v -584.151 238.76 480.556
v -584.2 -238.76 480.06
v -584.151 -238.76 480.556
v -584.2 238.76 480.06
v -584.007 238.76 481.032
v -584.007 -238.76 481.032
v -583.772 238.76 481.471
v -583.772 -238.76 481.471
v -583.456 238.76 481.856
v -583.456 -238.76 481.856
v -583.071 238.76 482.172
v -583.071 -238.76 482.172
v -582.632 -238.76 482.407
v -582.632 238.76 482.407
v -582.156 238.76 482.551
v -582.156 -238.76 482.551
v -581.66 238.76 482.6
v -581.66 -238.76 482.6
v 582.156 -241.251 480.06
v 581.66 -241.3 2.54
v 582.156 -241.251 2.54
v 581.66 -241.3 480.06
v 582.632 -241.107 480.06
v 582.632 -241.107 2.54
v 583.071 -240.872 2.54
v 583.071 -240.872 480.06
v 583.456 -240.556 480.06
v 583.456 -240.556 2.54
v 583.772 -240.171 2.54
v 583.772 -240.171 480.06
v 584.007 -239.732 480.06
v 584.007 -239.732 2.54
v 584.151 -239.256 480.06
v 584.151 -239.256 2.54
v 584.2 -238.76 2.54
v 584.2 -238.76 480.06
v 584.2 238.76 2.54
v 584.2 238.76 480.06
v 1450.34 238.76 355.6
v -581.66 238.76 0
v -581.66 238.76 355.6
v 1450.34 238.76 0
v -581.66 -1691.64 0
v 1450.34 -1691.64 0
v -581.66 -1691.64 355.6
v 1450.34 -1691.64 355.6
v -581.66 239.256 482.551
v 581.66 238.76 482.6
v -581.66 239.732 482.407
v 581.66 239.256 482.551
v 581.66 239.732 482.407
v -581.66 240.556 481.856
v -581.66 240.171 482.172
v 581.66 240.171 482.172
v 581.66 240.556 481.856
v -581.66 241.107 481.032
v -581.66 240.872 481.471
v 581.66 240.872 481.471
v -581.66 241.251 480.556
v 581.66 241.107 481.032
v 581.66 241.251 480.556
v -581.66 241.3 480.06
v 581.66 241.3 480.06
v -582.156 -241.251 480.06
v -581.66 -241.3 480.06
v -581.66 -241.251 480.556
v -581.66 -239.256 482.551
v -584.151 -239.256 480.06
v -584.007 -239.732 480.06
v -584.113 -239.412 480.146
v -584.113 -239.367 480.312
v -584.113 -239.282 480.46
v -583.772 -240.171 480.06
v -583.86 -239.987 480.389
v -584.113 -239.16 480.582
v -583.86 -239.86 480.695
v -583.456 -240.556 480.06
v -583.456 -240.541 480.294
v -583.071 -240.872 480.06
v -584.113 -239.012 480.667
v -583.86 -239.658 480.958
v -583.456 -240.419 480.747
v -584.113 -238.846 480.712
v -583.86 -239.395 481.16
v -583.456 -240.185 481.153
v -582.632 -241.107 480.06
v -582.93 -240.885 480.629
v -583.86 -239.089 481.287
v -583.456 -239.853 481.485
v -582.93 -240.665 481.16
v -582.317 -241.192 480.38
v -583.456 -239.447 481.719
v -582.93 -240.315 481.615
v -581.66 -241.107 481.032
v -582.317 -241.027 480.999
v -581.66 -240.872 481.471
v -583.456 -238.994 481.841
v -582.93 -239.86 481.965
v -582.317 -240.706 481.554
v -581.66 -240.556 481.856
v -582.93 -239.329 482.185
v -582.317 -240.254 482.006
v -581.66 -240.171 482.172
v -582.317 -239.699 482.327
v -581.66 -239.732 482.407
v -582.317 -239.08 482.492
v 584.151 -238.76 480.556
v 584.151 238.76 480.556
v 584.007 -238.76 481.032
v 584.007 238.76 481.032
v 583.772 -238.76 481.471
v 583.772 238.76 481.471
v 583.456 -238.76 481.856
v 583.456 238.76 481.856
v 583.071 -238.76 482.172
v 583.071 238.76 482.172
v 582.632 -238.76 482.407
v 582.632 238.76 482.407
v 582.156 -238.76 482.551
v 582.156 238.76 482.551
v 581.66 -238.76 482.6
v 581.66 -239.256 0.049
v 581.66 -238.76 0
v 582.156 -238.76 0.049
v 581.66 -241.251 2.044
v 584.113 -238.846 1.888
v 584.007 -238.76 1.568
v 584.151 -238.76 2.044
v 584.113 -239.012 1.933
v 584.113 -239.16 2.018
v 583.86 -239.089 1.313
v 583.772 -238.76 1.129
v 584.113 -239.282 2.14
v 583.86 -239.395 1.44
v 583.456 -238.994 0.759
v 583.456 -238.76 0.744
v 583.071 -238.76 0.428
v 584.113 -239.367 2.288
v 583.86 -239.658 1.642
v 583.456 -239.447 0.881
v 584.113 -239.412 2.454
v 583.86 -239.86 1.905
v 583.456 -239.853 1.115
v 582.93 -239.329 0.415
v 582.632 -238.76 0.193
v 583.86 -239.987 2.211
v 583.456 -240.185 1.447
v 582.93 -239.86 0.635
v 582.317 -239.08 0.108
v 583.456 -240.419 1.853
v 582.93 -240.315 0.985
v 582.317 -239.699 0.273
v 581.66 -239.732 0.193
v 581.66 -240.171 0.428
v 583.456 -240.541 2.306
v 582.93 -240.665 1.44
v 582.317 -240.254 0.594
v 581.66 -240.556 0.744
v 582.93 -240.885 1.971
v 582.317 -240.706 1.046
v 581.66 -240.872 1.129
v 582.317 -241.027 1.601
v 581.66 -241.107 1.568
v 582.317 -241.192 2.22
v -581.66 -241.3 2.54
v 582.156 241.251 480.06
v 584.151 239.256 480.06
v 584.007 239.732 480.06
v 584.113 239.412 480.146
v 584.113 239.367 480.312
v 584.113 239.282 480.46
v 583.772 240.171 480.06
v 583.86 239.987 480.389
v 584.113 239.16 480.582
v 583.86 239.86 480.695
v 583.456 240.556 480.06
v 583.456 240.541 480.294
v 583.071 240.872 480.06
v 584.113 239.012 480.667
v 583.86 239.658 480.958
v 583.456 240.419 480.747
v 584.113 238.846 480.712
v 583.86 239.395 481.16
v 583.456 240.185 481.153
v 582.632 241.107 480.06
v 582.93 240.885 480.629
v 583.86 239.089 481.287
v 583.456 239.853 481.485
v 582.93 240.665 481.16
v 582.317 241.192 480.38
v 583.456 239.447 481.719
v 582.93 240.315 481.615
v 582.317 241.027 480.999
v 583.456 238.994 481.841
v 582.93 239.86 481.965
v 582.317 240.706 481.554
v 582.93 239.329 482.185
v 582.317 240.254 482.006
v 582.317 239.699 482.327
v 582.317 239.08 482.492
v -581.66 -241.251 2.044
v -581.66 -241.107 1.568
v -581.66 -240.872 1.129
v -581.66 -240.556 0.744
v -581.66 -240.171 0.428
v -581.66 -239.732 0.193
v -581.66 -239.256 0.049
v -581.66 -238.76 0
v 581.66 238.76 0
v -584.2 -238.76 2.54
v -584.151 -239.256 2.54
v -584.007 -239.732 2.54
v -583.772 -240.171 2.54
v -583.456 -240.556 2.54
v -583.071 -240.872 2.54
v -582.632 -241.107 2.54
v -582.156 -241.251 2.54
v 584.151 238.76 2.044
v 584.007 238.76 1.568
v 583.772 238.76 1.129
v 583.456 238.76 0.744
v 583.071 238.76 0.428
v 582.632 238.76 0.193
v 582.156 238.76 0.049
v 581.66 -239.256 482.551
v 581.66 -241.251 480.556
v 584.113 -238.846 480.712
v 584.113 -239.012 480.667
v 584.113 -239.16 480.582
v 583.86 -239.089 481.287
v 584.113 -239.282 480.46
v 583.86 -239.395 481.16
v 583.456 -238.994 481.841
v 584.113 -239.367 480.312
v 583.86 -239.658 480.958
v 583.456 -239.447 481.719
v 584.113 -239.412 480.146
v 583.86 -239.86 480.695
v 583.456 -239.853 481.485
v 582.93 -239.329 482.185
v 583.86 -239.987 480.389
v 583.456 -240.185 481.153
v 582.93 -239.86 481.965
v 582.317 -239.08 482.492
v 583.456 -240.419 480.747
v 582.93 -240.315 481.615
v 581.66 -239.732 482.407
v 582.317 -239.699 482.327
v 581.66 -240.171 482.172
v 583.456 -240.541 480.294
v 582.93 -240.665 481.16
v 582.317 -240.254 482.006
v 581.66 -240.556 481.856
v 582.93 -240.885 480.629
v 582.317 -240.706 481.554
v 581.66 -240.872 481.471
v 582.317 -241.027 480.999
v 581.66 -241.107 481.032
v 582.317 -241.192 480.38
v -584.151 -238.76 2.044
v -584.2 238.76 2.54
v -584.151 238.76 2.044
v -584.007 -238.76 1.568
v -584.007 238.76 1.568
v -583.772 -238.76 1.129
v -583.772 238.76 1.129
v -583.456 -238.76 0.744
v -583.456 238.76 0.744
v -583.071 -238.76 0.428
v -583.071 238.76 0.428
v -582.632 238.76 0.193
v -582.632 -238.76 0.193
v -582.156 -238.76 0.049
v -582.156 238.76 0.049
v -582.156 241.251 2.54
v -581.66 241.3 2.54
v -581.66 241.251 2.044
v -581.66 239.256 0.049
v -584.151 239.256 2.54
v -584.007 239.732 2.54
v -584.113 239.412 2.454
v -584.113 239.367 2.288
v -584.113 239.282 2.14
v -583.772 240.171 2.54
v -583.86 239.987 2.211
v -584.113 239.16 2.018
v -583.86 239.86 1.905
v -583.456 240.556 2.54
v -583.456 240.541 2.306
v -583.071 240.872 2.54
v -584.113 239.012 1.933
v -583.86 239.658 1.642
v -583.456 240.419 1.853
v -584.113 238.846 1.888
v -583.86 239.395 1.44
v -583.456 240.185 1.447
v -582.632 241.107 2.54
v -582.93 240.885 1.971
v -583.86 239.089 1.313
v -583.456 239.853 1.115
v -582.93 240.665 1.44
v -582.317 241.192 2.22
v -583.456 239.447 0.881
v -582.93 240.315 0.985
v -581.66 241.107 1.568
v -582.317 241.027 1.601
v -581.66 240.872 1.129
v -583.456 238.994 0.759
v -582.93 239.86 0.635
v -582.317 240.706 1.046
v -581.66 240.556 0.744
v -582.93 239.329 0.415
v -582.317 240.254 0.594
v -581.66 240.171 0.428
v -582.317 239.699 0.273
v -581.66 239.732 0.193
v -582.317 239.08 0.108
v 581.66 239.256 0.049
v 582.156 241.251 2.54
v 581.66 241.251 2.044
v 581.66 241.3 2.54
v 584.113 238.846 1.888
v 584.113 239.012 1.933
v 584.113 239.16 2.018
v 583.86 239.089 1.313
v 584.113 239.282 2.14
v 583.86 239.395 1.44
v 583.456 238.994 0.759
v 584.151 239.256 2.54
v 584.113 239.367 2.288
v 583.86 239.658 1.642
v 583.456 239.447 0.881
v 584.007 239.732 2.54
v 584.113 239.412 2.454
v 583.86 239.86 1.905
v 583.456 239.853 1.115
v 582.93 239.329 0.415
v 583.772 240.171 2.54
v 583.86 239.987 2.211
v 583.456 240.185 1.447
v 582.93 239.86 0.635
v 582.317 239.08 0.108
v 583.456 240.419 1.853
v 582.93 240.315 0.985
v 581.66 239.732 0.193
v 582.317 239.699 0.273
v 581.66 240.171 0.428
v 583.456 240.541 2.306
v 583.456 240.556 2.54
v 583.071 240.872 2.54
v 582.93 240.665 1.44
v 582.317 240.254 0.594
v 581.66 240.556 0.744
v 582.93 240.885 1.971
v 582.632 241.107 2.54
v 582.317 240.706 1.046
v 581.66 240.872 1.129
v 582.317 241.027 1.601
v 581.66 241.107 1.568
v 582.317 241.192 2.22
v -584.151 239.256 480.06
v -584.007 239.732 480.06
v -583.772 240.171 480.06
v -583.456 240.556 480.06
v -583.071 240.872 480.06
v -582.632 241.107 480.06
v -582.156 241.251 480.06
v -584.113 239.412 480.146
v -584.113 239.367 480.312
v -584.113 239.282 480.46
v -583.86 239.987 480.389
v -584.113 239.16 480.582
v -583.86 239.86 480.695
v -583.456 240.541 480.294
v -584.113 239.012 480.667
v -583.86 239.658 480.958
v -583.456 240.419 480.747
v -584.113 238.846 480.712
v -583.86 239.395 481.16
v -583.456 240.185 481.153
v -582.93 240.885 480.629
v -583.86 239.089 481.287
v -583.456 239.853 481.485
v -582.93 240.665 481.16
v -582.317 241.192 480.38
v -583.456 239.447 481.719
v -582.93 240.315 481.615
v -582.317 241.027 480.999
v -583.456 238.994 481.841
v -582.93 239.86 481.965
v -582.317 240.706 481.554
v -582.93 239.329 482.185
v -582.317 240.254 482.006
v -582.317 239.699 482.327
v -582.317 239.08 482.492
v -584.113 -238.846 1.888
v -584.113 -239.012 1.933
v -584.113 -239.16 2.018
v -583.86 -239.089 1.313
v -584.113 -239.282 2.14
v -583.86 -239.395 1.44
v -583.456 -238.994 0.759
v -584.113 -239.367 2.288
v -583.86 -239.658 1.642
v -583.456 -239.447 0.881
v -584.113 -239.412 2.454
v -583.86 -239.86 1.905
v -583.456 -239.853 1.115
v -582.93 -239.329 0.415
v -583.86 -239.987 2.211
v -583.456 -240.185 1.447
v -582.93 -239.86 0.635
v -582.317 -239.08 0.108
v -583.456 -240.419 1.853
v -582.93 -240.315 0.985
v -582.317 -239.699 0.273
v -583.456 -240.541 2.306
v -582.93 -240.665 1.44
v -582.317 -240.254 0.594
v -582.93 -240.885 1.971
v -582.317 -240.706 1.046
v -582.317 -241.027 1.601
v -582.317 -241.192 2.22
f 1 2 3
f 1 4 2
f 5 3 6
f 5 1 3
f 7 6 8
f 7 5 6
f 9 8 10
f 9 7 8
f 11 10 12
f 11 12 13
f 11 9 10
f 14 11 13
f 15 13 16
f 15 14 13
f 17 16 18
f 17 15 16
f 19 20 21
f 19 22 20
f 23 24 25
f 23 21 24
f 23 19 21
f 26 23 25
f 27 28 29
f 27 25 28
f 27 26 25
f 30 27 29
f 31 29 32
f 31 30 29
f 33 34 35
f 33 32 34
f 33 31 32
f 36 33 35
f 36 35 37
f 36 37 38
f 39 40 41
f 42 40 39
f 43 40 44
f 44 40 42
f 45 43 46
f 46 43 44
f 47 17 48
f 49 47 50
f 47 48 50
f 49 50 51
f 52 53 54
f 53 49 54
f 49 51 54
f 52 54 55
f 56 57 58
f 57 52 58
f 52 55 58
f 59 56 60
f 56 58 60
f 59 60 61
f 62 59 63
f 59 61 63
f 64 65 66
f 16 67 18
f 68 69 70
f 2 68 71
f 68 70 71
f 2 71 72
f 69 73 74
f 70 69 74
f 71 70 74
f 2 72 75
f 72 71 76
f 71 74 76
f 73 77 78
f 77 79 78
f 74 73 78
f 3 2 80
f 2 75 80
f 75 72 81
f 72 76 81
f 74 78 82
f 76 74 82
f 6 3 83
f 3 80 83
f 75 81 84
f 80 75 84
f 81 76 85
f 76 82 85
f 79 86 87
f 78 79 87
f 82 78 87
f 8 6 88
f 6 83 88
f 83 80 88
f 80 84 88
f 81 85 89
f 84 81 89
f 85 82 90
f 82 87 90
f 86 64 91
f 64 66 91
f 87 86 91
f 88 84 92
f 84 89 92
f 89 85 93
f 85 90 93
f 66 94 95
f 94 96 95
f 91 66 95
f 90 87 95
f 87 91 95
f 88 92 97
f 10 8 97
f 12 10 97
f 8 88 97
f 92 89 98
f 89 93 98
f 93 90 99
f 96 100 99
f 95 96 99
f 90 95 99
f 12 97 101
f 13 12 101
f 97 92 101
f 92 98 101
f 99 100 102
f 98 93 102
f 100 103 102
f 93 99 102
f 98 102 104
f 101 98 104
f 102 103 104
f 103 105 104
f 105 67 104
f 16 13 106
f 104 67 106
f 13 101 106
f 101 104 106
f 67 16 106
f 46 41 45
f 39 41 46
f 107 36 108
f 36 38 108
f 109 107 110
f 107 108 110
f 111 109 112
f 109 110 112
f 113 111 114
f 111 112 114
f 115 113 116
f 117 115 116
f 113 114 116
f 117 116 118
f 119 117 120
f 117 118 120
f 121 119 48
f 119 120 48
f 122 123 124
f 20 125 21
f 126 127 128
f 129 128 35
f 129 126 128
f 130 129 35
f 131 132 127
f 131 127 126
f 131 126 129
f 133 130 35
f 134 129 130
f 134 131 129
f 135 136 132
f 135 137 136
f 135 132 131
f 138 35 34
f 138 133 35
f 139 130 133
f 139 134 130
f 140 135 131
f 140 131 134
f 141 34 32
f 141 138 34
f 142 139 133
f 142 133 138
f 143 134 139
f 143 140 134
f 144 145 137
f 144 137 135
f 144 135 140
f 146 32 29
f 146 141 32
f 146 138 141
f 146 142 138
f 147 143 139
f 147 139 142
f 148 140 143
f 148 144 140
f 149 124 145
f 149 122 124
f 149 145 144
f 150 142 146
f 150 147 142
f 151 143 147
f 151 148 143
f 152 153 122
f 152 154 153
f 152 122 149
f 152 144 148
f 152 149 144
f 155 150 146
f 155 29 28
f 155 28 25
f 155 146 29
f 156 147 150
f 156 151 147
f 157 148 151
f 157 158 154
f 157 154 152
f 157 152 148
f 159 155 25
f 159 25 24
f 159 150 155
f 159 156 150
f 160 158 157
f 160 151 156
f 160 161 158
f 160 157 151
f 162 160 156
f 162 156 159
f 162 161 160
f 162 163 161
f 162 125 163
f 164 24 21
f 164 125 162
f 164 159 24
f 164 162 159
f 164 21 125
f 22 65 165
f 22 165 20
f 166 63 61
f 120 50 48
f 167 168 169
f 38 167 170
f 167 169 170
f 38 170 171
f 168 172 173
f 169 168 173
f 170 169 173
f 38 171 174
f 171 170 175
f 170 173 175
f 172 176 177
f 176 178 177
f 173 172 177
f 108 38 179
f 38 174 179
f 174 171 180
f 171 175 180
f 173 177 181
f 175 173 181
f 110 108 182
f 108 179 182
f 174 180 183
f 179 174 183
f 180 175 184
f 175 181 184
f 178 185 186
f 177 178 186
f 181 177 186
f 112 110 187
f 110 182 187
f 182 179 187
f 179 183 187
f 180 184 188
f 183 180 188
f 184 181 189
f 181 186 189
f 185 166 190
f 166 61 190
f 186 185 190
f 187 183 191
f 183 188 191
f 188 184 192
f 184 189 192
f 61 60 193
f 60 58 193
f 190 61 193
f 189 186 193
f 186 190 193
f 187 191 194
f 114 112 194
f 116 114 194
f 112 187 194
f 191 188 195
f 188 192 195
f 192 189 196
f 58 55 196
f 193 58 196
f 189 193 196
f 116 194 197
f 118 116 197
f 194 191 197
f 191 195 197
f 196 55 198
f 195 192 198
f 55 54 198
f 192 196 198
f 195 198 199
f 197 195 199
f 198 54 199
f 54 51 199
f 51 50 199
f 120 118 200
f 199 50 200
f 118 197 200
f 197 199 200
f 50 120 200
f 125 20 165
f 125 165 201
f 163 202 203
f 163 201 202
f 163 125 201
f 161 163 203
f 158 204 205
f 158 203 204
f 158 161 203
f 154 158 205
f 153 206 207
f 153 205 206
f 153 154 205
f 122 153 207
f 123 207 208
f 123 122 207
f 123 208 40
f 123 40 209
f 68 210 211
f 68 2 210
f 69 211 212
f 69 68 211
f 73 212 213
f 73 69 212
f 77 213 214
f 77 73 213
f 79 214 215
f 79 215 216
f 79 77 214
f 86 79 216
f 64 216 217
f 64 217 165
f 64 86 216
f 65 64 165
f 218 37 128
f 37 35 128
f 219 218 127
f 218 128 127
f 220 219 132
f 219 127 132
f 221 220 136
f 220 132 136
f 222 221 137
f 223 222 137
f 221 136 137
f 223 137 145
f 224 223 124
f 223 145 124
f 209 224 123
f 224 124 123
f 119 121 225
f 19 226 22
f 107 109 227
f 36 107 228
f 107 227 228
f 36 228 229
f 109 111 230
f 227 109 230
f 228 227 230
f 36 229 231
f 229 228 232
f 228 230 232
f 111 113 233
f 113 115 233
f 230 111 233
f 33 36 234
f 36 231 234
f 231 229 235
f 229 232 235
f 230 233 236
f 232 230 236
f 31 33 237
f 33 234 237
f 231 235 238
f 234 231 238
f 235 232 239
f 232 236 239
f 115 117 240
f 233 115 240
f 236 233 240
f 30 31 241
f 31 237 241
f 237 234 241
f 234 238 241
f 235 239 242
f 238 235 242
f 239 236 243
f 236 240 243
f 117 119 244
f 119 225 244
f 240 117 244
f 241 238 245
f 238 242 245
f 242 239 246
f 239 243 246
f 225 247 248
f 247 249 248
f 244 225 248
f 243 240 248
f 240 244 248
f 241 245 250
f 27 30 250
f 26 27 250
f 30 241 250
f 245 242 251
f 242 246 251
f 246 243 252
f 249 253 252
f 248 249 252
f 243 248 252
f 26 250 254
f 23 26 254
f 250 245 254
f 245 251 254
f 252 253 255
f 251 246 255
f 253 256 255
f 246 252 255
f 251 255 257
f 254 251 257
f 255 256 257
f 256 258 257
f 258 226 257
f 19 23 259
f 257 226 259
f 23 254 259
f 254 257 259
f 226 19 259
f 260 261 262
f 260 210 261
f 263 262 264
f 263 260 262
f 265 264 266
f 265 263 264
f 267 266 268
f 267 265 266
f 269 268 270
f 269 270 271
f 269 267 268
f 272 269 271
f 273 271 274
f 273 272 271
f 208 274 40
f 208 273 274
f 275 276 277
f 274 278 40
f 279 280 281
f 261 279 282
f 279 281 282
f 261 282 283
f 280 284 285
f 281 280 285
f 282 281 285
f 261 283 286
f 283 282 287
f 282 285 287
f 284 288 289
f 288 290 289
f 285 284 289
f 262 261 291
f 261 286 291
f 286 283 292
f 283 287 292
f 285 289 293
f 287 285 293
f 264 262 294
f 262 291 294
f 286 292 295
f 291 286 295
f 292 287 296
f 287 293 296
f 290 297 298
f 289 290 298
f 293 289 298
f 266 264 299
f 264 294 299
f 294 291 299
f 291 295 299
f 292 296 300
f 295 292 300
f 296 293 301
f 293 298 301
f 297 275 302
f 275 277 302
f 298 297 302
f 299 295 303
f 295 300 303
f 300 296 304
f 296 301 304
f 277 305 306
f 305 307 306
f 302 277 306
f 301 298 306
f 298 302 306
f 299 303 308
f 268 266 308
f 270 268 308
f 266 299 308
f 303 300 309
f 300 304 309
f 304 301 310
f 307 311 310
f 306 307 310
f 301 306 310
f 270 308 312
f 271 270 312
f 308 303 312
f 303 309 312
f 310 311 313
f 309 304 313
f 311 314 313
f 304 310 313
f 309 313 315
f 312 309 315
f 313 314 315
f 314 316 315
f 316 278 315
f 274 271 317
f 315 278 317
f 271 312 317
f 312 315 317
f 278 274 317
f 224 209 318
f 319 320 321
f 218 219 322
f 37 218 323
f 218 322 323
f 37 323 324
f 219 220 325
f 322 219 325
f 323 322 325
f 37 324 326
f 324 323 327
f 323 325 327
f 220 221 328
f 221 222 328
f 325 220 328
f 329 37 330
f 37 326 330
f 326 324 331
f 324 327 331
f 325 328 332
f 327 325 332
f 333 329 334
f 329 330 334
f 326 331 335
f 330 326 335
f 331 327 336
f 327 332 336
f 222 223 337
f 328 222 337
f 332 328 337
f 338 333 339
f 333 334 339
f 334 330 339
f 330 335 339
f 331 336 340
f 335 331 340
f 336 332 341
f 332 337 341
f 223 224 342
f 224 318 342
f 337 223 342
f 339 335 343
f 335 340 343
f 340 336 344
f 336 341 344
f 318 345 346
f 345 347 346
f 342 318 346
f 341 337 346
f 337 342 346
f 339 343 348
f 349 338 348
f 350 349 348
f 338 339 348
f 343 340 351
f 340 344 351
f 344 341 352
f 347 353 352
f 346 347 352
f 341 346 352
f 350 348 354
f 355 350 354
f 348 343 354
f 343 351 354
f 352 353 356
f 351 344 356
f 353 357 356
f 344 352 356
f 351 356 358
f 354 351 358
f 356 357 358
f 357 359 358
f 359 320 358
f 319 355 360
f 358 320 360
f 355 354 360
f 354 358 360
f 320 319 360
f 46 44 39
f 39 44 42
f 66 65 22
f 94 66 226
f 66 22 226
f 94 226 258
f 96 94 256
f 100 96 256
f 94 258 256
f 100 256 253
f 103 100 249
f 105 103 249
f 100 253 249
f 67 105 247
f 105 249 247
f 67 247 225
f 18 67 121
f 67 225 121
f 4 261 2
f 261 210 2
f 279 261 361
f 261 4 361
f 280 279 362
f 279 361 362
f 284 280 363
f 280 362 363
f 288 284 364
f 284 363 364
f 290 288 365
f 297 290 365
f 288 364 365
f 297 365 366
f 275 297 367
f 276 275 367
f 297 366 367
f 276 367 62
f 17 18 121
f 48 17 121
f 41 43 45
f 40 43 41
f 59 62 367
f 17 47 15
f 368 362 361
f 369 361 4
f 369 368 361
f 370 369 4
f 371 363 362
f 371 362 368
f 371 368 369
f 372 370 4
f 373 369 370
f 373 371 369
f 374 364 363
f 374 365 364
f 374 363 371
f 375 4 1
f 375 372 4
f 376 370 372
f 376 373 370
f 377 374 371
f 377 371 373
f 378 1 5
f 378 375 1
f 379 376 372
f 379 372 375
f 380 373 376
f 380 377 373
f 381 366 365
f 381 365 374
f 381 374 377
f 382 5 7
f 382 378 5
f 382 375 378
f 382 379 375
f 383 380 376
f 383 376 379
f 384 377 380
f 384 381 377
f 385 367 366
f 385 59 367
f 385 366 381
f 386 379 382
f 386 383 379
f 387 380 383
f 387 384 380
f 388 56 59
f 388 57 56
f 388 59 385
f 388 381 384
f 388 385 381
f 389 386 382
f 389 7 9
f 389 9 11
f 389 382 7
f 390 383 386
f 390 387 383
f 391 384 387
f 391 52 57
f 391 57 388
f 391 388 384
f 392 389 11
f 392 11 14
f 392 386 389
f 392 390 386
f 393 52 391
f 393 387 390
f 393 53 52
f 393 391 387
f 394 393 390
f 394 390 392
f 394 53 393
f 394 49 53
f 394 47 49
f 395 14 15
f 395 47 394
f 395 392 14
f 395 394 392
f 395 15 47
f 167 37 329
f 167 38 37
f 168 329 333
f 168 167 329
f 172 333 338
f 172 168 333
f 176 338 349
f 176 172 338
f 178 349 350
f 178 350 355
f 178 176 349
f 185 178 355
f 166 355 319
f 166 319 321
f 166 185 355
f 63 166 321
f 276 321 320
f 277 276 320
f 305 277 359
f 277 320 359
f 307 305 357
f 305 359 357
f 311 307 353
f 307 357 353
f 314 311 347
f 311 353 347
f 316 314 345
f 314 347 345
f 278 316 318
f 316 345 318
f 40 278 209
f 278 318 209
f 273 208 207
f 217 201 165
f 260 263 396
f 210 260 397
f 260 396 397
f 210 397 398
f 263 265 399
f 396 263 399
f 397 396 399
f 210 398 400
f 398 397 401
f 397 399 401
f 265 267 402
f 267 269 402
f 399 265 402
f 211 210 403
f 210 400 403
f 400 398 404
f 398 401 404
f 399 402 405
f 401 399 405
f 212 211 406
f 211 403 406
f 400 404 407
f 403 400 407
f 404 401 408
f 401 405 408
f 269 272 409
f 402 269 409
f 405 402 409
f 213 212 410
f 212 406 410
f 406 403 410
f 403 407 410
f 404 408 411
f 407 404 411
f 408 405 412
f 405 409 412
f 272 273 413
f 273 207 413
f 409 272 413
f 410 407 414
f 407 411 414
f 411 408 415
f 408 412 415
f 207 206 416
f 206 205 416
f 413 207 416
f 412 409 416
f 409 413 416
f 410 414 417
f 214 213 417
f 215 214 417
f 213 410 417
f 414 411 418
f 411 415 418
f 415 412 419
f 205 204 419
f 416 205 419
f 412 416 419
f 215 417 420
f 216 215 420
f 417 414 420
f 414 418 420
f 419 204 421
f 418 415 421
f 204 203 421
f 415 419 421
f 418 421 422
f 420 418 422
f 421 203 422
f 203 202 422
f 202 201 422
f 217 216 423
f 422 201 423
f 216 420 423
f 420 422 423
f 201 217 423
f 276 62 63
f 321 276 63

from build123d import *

# Parameters (mm, degrees)
F0_W     = 1168.4
F0_H     = 482.6
F1_DEPTH = 241.3
F2_R     = 2.54
F3_W     = 2032
F3_H     = 1930.4
F4_DEPTH = 355.6


with BuildPart() as f1:
    # F0 (on Front) → F1 (new body, symmetric)
    with BuildSketch(Plane.XZ):
        with Locations((0, 241.3)):
            Rectangle(F0_W, F0_H)
    extrude(amount=F1_DEPTH, both=True)

    # F2
    f2_edges = [f1.edges().sort_by_distance(p)[0] for p in [
        (0, -241.3, 482.6),
        (0, -241.3, 0),
        (0, 241.3, 482.6),
        (0, 241.3, 0),
        (584.2, 0, 0),
        (584.2, 241.3, 241.3),
        (584.2, 0, 482.6),
        (584.2, -241.3, 241.3),
        (-584.2, 241.3, 241.3),
        (-584.2, 0, 0),
        (-584.2, -241.3, 241.3),
        (-584.2, 0, 482.6),
    ]]
    fillet(f2_edges, radius=F2_R)


with BuildPart() as f4:
    # F3 (on Top) → F4 (new body)
    with BuildSketch(Plane.XY):
        with Locations((434.34, -726.44)):
            Rectangle(F3_W, F3_H)
    extrude(amount=F4_DEPTH)


solid = Compound([f1.part, f4.part])
